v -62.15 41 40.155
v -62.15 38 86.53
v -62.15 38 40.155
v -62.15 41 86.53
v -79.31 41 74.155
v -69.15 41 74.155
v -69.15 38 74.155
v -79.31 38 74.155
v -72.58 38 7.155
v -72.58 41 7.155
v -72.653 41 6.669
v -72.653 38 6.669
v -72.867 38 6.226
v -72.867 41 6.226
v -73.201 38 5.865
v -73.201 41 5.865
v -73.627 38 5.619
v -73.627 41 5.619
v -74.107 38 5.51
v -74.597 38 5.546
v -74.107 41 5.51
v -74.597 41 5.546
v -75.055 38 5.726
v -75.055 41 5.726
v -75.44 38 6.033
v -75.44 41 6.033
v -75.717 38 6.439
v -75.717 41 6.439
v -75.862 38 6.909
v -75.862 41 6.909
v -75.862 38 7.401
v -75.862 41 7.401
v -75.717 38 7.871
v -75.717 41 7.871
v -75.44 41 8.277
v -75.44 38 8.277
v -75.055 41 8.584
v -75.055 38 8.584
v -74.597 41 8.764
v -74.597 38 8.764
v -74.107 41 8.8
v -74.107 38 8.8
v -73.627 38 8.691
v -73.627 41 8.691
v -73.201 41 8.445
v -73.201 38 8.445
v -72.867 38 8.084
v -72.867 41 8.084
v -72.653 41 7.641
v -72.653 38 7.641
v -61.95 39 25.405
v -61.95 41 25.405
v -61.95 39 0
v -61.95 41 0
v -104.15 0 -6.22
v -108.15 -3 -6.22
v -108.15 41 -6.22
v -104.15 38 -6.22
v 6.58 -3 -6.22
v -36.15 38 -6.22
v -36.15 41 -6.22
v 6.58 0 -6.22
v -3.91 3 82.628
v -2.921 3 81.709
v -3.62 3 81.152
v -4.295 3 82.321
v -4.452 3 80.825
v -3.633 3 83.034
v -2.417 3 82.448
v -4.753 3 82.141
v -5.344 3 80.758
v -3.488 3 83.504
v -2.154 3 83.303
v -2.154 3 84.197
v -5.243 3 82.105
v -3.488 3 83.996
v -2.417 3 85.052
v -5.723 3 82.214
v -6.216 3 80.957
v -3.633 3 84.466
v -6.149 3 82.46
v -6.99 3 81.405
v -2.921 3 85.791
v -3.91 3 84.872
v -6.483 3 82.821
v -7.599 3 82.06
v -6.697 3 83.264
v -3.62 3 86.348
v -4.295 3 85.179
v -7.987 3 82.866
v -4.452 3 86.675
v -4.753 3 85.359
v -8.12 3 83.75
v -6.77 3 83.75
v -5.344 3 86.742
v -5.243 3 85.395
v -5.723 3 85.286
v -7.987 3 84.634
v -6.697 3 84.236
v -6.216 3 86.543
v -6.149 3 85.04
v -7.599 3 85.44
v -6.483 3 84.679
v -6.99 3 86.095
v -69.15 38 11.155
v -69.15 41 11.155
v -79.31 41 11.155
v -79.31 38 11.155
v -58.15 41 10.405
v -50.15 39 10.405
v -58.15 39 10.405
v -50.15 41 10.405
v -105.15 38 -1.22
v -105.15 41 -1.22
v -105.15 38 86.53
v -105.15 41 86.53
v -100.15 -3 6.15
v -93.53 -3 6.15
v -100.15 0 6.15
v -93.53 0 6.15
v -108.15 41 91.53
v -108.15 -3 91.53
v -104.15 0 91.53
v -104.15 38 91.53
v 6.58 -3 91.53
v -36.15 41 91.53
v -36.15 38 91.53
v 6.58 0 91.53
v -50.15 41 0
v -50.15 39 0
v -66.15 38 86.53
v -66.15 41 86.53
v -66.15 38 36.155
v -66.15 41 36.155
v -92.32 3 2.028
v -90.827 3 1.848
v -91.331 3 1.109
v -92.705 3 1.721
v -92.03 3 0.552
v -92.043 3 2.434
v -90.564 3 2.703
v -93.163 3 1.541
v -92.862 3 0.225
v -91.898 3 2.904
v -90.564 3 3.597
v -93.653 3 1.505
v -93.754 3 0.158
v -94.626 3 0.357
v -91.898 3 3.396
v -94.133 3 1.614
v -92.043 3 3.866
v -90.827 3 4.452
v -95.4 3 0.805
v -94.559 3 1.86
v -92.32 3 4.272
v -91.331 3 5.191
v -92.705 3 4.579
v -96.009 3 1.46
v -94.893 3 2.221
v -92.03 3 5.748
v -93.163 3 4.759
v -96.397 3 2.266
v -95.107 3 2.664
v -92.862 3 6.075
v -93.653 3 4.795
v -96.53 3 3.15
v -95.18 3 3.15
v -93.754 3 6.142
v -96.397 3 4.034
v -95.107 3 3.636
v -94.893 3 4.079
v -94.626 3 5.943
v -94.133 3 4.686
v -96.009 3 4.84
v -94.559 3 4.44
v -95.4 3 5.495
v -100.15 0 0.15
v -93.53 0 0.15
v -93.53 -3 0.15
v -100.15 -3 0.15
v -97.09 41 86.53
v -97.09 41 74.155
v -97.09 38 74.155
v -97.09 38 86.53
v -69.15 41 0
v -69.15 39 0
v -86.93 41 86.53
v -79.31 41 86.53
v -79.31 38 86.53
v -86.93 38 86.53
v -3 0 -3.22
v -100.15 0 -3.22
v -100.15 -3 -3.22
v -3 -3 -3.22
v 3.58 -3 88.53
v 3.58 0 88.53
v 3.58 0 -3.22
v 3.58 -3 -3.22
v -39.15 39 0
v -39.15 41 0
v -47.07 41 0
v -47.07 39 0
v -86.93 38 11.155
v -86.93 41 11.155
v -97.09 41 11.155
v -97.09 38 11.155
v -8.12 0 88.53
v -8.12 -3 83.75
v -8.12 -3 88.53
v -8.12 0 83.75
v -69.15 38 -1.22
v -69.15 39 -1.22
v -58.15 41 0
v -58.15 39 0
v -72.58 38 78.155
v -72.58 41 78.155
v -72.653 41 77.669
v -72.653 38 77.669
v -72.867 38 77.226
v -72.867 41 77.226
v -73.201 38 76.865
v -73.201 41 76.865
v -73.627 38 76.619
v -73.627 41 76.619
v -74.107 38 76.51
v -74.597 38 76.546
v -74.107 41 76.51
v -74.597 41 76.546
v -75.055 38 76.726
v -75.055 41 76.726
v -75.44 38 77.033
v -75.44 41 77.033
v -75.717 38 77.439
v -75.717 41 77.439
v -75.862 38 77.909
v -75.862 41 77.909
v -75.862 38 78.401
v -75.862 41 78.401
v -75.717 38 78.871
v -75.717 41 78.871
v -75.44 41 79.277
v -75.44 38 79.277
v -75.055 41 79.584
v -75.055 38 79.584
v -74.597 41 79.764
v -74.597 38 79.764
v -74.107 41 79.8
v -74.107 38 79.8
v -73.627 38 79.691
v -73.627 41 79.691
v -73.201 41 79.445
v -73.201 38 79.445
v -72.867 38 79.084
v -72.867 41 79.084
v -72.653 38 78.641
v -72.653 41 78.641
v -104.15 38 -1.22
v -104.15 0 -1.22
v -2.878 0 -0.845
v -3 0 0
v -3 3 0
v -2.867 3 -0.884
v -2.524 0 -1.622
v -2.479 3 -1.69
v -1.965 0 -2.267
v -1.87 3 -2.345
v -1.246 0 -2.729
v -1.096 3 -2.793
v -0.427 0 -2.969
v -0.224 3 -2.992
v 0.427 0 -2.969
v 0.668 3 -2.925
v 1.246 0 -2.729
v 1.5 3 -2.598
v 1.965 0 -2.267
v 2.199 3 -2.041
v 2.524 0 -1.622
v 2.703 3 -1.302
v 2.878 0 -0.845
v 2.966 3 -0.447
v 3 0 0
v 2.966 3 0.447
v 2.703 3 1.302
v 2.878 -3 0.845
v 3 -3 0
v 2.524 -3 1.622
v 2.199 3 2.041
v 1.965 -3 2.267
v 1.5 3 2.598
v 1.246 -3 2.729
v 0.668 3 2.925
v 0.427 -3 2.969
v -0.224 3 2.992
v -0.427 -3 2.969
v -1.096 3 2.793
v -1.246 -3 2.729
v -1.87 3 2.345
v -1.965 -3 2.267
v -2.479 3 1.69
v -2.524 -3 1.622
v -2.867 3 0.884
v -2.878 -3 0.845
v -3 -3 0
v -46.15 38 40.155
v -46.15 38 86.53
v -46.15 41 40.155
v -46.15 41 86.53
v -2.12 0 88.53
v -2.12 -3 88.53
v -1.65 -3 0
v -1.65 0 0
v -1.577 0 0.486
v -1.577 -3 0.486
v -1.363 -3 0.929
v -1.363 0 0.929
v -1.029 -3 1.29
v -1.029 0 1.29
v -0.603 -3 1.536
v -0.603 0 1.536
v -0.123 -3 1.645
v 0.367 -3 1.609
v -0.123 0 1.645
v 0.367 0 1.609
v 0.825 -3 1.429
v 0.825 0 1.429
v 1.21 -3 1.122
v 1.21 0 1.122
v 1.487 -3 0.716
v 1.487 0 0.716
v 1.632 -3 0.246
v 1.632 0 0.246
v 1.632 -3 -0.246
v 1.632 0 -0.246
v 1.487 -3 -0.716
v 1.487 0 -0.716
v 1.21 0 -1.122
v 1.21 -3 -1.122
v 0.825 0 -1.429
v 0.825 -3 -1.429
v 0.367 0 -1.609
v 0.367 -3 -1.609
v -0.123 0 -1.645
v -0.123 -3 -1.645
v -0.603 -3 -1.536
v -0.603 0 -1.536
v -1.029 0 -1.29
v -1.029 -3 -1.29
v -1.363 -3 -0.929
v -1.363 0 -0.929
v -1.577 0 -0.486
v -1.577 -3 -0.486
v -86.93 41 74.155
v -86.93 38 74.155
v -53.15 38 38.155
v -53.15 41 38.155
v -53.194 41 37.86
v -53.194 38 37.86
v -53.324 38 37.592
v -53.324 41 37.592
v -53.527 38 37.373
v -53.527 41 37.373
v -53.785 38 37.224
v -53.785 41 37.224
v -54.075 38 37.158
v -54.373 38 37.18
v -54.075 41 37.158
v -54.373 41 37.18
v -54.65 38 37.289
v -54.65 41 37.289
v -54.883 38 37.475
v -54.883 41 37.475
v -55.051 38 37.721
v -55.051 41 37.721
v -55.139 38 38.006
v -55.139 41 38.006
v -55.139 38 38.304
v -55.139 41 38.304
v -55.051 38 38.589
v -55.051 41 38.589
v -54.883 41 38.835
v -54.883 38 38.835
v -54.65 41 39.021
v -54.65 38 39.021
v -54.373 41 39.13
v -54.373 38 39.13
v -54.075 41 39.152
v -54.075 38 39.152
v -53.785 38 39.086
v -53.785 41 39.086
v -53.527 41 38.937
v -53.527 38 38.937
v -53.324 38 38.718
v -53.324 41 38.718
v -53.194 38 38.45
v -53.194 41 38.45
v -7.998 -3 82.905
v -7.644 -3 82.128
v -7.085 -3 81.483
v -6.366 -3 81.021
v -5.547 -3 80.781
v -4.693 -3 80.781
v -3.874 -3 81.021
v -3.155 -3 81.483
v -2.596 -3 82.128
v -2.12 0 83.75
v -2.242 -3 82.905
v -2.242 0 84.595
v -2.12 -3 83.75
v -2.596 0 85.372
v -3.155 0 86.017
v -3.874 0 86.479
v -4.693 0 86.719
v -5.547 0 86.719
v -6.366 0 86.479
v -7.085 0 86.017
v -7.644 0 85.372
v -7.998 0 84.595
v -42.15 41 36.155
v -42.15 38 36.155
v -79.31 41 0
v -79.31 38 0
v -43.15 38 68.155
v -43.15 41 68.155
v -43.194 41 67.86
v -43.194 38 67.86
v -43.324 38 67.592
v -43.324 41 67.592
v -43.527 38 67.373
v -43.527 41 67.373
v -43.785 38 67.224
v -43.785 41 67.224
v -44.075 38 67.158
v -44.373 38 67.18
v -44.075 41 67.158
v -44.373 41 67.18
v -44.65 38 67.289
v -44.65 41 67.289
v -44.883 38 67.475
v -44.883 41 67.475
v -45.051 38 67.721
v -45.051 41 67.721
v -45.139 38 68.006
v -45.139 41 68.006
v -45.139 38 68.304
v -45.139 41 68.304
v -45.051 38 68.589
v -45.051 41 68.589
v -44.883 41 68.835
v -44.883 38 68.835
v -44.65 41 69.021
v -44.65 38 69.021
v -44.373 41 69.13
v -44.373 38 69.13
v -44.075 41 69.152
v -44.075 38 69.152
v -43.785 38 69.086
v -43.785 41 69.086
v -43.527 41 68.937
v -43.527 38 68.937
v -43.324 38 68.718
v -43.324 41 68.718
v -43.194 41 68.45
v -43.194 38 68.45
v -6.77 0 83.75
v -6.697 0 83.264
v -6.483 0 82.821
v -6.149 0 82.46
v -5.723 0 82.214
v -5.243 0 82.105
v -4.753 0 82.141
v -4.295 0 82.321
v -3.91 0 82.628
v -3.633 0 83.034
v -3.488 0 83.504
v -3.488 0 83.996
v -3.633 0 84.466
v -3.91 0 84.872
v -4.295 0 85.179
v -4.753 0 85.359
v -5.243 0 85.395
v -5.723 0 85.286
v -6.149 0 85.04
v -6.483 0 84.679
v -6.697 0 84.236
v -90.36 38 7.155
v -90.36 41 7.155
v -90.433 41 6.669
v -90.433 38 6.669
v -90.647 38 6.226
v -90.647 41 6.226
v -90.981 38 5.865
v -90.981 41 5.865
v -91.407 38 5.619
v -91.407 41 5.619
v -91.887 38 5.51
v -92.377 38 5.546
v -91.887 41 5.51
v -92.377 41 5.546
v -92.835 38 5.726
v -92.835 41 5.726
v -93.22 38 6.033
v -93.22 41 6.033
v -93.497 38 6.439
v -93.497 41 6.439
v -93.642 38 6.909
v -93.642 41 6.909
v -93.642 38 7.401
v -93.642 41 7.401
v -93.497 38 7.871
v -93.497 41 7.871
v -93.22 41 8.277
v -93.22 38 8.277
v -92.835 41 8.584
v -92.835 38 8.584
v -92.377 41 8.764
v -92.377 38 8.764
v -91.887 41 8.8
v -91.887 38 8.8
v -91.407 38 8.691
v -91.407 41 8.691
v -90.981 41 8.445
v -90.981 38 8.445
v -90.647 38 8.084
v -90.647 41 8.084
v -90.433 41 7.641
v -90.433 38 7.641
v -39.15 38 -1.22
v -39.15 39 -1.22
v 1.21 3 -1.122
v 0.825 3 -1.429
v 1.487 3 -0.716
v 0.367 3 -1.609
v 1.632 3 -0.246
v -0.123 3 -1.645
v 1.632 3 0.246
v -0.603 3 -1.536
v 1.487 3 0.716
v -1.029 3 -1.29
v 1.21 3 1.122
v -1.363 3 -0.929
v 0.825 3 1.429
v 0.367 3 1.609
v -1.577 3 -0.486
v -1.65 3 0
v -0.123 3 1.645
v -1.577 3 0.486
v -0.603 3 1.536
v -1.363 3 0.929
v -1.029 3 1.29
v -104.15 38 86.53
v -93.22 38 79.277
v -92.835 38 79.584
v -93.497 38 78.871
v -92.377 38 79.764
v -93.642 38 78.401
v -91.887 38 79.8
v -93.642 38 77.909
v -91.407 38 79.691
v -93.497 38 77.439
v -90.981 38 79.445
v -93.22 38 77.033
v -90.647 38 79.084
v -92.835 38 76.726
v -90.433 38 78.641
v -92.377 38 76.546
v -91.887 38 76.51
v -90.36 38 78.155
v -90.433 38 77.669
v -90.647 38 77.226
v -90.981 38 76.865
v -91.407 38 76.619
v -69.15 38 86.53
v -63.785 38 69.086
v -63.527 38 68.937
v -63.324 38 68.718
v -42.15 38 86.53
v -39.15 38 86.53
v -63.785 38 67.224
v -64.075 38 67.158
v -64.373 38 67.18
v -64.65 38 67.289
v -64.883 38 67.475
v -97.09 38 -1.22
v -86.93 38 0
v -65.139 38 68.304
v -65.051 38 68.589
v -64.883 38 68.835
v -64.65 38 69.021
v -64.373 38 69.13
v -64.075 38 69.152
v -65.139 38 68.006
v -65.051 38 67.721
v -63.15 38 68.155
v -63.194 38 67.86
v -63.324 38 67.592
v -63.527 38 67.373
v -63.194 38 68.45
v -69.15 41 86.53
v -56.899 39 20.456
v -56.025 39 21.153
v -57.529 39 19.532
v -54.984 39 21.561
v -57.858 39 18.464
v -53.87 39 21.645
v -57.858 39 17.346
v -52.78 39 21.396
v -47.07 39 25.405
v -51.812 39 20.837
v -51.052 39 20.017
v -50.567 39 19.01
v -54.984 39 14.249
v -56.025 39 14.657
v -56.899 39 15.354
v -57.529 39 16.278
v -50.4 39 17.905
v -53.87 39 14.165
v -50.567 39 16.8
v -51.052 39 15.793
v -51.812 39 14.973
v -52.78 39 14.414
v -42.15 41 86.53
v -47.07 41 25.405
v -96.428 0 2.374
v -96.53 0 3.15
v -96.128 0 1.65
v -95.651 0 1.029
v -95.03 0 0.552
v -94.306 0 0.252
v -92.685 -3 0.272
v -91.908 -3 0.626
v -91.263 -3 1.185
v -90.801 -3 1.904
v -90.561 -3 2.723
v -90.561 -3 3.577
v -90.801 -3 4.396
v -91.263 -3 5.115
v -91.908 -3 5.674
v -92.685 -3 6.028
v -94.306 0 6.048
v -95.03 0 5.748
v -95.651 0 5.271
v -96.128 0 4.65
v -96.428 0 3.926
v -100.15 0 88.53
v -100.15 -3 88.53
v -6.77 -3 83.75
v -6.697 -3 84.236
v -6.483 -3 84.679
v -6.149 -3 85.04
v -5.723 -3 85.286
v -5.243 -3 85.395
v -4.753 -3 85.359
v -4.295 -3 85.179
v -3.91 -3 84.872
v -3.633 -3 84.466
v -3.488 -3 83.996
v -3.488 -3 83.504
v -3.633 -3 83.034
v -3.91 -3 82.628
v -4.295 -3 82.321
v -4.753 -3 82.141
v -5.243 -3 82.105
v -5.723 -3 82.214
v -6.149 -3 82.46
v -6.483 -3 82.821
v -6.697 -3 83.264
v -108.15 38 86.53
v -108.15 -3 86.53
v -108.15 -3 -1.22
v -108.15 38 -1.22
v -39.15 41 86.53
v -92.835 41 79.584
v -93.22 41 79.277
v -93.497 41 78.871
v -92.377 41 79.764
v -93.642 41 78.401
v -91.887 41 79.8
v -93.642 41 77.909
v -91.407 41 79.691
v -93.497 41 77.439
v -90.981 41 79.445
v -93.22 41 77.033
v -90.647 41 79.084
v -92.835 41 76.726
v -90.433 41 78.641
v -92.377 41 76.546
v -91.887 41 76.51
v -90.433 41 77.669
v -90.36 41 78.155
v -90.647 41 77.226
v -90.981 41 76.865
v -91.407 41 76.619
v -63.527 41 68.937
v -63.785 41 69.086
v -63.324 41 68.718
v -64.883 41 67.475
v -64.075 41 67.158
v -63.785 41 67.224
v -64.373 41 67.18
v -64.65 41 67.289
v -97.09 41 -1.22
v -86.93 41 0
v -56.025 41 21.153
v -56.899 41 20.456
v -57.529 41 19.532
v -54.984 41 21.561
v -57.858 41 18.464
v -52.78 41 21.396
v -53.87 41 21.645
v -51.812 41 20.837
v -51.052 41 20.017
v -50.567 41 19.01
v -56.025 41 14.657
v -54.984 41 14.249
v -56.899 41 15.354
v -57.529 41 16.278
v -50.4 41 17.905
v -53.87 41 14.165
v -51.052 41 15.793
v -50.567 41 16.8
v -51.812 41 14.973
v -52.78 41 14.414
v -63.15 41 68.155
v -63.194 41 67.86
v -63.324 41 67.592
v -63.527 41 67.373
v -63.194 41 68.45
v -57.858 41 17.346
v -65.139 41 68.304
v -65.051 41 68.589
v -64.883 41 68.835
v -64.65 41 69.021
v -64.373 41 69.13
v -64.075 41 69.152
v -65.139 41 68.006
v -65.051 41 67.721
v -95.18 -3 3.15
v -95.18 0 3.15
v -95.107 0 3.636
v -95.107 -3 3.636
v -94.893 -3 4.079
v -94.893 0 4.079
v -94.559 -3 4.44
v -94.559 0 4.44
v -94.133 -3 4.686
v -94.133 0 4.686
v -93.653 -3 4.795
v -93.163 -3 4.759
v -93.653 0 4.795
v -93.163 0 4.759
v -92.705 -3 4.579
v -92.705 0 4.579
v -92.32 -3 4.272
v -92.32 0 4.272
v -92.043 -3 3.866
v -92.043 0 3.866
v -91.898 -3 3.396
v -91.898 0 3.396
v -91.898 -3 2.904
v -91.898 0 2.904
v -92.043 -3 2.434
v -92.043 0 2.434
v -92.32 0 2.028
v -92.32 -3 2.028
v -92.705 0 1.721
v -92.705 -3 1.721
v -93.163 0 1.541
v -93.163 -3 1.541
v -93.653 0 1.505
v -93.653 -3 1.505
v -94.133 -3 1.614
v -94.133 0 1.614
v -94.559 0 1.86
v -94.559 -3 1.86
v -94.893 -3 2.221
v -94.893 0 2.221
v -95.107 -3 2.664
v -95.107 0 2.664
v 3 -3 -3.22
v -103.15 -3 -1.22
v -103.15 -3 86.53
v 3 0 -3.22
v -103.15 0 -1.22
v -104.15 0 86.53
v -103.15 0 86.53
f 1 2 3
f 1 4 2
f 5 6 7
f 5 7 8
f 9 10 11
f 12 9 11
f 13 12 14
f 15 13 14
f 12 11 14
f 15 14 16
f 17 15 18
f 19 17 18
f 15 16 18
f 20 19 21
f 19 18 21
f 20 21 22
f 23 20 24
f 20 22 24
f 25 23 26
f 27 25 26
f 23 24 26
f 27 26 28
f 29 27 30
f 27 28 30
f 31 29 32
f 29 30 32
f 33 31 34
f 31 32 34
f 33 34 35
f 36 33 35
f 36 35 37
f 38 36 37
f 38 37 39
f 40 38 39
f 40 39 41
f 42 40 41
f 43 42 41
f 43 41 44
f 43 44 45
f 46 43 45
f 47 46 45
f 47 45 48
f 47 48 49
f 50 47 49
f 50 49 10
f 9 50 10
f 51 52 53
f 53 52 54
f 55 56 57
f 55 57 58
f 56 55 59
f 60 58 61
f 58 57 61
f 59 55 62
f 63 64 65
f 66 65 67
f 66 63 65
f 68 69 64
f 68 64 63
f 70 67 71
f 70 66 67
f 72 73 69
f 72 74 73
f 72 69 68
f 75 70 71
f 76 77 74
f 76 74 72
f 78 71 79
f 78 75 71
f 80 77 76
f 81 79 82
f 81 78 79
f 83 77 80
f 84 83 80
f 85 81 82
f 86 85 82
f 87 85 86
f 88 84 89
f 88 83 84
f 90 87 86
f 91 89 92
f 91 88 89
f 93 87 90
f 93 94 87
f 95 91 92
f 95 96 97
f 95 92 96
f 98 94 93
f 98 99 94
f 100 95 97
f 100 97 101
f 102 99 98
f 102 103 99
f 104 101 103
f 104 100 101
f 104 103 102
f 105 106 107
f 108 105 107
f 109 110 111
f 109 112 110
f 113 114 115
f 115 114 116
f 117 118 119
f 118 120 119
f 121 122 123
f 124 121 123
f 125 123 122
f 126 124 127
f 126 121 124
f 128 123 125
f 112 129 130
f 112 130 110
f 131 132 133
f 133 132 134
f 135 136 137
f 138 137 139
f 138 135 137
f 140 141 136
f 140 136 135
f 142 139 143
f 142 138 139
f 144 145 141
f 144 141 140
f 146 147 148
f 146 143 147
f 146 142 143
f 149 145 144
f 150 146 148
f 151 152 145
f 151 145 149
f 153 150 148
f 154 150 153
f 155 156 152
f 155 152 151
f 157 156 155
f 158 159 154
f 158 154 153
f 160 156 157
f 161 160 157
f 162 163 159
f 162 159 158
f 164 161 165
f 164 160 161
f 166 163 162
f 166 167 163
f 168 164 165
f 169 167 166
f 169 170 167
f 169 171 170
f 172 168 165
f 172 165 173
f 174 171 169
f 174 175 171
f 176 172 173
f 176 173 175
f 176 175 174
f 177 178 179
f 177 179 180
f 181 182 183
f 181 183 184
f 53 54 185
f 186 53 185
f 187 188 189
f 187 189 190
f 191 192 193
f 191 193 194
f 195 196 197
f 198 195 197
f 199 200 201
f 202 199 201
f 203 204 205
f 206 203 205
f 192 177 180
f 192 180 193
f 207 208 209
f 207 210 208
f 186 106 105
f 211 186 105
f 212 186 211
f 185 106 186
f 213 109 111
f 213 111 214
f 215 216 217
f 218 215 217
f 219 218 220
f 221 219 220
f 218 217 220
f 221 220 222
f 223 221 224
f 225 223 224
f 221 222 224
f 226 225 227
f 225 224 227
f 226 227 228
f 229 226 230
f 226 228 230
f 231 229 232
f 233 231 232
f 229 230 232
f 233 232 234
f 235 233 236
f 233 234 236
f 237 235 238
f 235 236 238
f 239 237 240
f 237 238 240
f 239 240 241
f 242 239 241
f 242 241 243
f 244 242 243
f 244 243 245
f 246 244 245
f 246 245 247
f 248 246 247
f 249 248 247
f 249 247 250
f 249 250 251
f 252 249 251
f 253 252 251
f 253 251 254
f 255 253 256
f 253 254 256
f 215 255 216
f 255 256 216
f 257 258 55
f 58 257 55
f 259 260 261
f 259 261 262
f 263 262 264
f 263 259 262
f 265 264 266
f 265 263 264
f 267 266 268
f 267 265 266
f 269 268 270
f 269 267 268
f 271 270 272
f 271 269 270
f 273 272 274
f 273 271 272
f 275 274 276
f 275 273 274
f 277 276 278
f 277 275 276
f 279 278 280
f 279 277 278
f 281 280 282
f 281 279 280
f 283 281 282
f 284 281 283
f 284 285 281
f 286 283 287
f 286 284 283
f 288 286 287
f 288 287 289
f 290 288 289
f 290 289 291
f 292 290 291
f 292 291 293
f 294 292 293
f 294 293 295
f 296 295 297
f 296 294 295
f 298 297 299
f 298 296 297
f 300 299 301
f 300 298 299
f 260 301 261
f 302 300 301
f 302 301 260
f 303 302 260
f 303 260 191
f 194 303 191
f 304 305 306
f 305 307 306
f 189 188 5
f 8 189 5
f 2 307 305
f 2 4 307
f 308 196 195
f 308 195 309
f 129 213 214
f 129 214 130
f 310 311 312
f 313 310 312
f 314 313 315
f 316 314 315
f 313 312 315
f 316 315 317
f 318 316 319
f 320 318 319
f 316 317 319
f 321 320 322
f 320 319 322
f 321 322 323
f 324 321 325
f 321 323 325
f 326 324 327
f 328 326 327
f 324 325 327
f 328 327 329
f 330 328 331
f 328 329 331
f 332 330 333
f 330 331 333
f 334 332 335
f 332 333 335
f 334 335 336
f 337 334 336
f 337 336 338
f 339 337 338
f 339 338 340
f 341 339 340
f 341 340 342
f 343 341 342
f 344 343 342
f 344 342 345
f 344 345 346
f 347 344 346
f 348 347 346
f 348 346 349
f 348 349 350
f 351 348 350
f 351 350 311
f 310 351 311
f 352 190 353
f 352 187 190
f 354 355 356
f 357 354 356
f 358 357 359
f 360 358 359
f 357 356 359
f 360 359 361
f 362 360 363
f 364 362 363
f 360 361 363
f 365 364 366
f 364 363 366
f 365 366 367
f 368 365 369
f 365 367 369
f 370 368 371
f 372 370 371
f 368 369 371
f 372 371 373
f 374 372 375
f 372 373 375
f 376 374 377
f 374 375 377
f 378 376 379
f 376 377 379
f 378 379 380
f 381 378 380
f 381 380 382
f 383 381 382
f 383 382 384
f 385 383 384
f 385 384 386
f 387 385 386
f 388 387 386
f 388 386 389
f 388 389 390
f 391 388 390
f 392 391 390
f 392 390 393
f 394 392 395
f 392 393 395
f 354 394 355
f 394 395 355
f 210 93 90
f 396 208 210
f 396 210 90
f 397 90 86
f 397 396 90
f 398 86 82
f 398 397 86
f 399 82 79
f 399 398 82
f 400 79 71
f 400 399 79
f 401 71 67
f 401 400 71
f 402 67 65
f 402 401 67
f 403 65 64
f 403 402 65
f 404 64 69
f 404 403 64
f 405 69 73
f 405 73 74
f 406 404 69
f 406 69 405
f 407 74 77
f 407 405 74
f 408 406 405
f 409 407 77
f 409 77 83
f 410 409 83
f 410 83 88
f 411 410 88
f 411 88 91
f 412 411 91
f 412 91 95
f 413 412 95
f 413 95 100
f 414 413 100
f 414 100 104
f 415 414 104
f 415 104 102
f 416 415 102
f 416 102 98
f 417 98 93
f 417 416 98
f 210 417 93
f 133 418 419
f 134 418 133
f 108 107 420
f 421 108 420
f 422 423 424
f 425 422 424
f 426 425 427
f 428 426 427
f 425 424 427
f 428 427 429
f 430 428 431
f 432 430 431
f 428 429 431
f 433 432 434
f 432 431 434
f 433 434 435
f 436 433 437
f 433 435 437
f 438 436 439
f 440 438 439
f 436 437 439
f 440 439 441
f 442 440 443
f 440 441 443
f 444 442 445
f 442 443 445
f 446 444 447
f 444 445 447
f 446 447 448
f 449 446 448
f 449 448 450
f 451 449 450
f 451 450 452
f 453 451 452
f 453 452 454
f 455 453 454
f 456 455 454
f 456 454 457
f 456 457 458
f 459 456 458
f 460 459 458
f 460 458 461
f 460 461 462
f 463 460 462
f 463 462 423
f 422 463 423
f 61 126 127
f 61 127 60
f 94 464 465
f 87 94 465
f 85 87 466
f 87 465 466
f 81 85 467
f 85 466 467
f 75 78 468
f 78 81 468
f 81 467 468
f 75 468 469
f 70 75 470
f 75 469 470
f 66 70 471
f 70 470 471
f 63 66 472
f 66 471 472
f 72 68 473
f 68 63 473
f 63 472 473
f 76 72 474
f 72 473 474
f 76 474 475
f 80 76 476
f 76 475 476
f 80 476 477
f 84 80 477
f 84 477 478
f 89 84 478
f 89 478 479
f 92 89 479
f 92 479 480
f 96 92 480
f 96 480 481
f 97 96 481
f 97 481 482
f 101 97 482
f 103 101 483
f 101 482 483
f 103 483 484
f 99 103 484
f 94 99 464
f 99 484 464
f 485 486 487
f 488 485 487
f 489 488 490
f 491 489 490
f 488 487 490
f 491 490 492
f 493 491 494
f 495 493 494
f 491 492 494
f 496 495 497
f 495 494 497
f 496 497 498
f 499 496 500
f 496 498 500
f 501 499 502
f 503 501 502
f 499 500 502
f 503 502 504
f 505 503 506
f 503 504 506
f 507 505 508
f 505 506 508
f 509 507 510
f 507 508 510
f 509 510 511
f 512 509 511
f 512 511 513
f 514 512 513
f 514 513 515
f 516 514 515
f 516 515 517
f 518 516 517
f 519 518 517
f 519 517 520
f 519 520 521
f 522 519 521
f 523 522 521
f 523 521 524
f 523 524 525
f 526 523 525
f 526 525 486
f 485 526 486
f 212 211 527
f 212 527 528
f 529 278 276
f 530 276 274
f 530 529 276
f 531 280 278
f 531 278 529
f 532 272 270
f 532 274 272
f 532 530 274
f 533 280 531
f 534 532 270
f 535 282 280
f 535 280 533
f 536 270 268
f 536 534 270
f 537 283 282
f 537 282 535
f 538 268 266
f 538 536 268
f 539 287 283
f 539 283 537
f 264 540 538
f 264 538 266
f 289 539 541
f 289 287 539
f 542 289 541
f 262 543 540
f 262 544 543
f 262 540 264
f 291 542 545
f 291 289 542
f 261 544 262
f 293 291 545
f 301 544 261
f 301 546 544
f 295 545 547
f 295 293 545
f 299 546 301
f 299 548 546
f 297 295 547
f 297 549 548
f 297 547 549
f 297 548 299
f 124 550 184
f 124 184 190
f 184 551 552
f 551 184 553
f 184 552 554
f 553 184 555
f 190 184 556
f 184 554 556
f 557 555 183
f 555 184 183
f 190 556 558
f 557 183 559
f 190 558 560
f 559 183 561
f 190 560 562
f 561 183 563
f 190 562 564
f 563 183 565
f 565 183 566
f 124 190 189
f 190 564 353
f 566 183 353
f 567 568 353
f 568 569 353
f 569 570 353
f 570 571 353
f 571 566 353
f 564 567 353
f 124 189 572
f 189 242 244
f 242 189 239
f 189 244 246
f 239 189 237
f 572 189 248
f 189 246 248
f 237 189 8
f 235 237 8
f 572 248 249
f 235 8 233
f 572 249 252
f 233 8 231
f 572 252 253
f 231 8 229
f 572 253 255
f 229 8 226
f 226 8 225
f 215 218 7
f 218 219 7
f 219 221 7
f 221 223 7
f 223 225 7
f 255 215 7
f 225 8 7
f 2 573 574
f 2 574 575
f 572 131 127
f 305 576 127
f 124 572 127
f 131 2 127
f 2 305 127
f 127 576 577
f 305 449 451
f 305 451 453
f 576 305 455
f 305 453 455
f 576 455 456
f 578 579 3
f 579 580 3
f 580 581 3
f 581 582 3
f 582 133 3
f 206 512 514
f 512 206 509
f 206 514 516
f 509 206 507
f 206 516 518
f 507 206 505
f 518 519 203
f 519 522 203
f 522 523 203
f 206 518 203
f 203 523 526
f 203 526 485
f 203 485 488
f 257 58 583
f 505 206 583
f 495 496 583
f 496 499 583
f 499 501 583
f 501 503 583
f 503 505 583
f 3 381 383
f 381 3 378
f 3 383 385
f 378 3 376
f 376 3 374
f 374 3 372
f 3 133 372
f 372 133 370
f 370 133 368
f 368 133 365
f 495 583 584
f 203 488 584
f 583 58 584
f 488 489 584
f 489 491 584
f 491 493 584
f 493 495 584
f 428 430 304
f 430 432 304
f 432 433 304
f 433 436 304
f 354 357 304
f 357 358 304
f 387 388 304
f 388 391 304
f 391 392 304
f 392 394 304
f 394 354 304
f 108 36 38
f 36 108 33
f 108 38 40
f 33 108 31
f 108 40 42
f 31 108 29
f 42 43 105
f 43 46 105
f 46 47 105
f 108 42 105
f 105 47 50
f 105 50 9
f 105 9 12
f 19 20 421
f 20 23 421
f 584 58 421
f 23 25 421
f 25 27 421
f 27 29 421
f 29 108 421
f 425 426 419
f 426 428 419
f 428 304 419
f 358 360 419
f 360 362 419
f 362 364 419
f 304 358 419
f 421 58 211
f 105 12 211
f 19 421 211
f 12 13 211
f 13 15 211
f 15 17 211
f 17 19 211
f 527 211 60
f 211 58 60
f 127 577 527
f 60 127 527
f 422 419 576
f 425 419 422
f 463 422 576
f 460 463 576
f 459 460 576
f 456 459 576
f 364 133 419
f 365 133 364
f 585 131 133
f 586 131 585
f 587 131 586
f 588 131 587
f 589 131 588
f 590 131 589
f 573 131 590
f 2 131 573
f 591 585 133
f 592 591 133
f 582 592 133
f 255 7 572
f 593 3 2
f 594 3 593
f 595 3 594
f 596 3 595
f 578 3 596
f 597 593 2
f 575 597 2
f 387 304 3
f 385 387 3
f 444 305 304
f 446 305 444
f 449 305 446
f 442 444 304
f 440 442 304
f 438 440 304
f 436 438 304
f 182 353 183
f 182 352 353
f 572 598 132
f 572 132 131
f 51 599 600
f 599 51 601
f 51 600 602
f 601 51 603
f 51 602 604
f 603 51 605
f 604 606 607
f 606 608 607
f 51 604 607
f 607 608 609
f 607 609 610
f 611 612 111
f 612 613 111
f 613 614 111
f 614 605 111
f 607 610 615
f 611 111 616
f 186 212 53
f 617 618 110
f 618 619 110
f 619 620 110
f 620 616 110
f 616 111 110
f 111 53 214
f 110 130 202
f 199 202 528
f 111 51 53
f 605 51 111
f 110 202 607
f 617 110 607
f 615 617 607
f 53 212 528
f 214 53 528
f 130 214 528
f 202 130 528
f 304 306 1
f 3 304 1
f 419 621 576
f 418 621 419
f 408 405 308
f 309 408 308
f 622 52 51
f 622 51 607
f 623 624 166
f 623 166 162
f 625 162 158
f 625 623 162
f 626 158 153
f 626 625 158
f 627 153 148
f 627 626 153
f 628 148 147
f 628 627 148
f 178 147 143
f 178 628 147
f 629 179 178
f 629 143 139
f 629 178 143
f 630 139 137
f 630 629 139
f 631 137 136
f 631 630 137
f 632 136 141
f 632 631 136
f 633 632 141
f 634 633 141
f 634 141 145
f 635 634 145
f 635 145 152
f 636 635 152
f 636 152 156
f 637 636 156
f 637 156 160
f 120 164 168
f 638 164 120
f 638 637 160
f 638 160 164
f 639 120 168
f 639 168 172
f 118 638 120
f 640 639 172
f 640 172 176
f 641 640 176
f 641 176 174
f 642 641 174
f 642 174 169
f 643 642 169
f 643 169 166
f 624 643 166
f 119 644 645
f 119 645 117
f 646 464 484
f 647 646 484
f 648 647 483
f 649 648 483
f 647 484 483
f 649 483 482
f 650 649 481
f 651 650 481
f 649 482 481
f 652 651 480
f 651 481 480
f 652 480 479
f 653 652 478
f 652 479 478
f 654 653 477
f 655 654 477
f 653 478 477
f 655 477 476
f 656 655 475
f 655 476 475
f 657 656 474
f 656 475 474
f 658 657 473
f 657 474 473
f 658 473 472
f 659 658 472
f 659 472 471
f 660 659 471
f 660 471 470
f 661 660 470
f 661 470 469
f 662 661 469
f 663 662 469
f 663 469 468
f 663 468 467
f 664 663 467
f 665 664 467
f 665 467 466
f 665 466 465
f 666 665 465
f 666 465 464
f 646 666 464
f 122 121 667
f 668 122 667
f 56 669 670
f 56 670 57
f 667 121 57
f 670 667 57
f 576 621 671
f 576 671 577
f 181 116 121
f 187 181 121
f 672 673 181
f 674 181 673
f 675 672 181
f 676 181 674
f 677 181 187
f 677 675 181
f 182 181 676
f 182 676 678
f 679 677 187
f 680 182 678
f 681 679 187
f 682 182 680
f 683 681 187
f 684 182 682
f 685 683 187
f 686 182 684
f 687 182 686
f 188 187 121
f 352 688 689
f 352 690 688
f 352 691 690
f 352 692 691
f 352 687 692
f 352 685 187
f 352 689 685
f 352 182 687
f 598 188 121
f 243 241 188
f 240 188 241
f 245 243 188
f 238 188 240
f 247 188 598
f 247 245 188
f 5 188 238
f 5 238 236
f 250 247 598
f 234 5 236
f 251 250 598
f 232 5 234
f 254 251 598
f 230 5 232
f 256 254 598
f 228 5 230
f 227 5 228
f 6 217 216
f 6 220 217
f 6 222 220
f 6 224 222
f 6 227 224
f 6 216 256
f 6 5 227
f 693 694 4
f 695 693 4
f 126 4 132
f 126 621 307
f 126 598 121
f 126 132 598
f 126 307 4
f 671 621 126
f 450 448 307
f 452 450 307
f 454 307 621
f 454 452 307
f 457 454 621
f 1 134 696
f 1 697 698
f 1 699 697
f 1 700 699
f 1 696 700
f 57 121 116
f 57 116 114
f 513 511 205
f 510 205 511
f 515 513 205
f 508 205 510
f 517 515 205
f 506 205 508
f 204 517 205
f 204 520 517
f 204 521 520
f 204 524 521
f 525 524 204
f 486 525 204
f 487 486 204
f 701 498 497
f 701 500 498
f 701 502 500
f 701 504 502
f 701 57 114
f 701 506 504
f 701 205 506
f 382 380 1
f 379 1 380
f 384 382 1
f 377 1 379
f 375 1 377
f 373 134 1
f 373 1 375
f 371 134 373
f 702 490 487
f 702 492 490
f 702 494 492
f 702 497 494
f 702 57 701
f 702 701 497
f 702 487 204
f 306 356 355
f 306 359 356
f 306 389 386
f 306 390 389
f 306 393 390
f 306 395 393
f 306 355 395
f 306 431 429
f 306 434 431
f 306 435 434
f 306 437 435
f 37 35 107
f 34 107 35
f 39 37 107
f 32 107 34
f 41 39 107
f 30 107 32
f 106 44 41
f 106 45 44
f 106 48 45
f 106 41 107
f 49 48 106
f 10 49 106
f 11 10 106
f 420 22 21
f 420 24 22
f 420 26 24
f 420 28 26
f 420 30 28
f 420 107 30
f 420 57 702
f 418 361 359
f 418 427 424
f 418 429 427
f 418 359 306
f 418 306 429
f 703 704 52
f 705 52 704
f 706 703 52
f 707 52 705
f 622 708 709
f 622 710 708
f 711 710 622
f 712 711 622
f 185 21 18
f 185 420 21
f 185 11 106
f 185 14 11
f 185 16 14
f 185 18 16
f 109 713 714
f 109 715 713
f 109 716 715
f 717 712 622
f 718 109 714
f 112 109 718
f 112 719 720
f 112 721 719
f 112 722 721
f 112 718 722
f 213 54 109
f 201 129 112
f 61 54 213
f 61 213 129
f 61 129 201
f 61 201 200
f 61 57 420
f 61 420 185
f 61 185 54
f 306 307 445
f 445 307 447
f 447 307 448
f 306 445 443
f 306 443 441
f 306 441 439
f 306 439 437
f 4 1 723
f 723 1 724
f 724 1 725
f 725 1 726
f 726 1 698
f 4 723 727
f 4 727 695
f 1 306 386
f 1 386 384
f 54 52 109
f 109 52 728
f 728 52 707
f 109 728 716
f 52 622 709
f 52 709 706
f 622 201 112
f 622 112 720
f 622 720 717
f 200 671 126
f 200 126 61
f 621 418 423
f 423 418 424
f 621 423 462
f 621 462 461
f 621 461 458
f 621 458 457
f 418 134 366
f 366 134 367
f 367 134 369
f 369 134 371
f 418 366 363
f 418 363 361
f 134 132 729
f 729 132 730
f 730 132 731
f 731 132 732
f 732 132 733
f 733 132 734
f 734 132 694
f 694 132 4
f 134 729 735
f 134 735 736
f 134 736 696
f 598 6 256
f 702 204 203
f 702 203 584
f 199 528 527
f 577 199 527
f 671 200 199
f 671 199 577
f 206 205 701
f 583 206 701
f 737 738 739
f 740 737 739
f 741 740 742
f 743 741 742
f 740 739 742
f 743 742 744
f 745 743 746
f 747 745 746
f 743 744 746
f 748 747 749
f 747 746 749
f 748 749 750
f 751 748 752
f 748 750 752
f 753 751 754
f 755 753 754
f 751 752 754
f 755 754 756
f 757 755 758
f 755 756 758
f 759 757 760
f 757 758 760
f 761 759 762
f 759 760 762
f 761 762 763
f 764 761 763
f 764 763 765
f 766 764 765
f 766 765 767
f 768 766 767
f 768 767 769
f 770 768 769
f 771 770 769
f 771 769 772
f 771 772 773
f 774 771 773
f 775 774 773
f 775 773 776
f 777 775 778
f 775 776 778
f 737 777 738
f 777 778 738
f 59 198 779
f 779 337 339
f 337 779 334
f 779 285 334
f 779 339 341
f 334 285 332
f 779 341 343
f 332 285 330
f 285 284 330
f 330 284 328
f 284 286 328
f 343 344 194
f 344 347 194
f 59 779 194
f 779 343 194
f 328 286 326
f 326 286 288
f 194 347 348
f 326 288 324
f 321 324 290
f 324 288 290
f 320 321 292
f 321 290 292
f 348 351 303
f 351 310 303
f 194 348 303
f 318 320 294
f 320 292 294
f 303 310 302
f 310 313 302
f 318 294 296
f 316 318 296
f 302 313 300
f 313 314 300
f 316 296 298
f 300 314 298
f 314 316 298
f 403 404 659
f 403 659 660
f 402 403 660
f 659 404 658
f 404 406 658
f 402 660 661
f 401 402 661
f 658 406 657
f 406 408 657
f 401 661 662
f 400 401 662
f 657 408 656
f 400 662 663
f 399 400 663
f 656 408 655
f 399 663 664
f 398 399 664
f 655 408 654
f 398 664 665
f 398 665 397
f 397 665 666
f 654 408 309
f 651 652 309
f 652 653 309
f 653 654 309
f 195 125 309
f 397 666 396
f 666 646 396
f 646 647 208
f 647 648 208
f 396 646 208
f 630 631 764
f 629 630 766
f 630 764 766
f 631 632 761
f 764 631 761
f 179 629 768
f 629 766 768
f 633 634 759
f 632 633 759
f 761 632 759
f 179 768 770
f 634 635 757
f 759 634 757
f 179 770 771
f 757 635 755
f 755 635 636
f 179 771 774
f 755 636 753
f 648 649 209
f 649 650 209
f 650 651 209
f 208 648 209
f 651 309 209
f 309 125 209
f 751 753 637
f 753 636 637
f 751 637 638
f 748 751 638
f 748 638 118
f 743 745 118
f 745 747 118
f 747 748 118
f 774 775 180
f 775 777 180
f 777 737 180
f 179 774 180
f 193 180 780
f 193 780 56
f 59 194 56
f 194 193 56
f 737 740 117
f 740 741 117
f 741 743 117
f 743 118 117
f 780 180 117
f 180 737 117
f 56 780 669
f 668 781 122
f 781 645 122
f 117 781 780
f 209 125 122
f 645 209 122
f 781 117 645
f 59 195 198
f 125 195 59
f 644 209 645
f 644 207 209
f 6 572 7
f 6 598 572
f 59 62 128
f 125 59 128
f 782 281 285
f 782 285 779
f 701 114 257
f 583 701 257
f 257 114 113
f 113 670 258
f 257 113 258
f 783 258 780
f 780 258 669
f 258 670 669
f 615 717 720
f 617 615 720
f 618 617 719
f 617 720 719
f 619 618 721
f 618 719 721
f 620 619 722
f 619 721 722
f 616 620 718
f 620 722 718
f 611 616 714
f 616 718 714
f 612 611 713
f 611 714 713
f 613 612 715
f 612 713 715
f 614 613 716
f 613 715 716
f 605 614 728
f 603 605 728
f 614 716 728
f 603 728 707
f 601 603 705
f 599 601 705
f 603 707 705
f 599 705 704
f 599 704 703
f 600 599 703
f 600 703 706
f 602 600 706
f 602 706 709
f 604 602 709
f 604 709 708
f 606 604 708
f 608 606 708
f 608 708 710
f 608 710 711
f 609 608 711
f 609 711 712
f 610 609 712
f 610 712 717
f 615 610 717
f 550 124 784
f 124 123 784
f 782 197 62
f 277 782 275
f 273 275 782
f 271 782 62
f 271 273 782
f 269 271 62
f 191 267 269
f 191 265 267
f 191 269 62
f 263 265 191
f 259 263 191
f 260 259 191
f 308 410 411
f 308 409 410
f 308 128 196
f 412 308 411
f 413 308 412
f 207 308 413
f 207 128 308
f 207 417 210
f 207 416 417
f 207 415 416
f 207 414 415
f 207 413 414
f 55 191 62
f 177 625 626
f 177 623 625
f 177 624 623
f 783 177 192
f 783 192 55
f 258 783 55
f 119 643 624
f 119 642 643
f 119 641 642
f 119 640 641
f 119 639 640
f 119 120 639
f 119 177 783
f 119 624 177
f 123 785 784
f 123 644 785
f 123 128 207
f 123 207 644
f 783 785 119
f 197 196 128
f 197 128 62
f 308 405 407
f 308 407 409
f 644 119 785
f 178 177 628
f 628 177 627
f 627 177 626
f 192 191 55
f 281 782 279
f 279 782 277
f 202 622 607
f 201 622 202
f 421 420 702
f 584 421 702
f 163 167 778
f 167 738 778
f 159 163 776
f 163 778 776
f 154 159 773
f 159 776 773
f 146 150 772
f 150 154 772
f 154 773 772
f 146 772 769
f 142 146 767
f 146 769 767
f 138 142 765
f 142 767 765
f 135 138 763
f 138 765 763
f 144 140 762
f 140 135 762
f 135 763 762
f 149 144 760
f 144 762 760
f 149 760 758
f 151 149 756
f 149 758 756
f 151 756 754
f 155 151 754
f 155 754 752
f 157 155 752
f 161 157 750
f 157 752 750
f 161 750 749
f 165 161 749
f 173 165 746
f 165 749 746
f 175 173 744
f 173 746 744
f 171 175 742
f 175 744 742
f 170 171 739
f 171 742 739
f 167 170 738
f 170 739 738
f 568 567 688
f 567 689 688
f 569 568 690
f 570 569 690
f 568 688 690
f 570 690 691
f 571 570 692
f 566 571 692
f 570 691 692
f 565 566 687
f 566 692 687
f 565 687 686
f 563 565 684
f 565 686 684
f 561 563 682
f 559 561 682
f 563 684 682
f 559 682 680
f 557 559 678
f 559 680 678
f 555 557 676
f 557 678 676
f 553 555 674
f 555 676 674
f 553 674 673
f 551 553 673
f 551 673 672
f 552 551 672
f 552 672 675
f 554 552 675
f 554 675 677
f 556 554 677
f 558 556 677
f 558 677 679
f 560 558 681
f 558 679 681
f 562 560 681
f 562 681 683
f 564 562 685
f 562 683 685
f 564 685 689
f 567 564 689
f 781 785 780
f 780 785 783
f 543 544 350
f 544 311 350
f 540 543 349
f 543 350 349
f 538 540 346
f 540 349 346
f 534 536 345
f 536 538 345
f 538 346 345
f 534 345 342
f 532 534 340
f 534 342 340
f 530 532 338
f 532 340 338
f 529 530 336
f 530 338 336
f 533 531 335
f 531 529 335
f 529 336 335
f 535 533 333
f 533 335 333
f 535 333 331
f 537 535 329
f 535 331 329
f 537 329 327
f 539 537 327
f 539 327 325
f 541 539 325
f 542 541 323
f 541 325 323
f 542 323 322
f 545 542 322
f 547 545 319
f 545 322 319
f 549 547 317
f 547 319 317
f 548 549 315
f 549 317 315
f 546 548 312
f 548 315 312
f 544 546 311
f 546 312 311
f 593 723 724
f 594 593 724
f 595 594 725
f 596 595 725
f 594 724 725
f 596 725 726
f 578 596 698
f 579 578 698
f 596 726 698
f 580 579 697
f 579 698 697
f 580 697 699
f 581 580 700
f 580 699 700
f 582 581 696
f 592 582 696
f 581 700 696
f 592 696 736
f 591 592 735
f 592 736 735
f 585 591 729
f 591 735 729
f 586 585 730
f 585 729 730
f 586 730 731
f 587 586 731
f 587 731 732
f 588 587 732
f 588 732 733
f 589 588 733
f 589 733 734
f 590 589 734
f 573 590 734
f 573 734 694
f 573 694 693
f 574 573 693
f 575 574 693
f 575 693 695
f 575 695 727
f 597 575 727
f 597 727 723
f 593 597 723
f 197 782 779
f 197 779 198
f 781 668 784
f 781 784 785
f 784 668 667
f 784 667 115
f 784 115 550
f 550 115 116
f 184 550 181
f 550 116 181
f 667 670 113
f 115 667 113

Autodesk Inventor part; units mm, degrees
ref_plane "YZ Plane" through (0, 0, 0) normal (1, 0, 0) x (0, 1, 0)
ref_plane "XZ Plane" through (0, 0, 0) normal (0, 1, 0) x (-1, 0, 0)
ref_plane "XY Plane" through (0, 0, 0) normal (0, 0, 1) x (1, 0, 0)
sketch "Sketch1" plane through (0, 0, 0) normal (0, 1, 0) x (-1, 0, 0)
  circle A0 centre (0, 0) radius 1.65
  circle A1 centre (0, 0) radius 3
  circle A2 centre (5.12, 83.75) radius 1.65
  circle A3 centre (5.12, 83.75) radius 3
  circle A4 centre (93.53, 3.15) radius 1.65
  circle A5 centre (93.53, 3.15) radius 3
  line L0 (-6.58, 0) -> (-6.58, -6.22)
  line L1 (-6.58, -6.22) -> (-6.58, 91.53)
  line L2 (-6.58, 91.53) -> (103.15, 91.53)
  line L3 (103.15, 86.53) -> (103.15, -1.22)
  line L4 (103.15, -6.22) -> (-6.58, -6.22)
  line L5 (-6.58, 91.53) -> (-6.58, 88.53)
  line L6 (103.15, 91.53) -> (100.15, 91.53)
  line L7 (3, 0) -> (3, -3.22)
  line L8 (-3, 0) -> (-3, -3.22)
  line L9 (2.12, 83.75) -> (2.12, 88.53)
  line L10 (8.12, 83.75) -> (8.12, 88.53)
  line L11 (93.53, 6.15) -> (100.15, 6.15)
  line L12 (93.53, 0.15) -> (100.15, 0.15)
  line L13 (-3.58, 88.53) -> (-3.58, -3.22)
  line L14 (103.15, 91.53) -> (108.15, 91.53)
  line L15 (108.15, 91.53) -> (108.15, 86.53)
  line L16 (108.15, 86.53) -> (103.15, 86.53)
  line L17 (103.15, -6.22) -> (108.15, -6.22)
  line L18 (108.15, -6.22) -> (108.15, -1.22)
  line L19 (108.15, -1.22) -> (103.15, -1.22)
  line L20 (100.15, 88.53) -> (100.15, 6.15)
  line L21 (100.15, 0.15) -> (100.15, -3.22)
  line L22 (100.15, -3.22) -> (3, -3.22)
  line L23 (-3, -3.22) -> (-3.58, -3.22)
  line L24 (-3.58, 88.53) -> (2.12, 88.53)
  line L25 (8.12, 88.53) -> (100.15, 88.53)
  dimension "d0" = 3.3
  dimension "d1" = 6
  dimension "d4" = 3.3
  dimension "d5" = 6
  dimension "d8" = 3.3
  dimension "d9" = 6
extrude "Extrusion1" add sketch "Sketch1" against normal blind 3 contours A1 | A5 | A3 | L1 L2 L14 L15 L16 L3 L19 L18 L17 L4 L0
extrude "Extrusion2" add sketch "Sketch1" along normal blind 3 contours A1 | A5 | A3
sketch "Sketch2" plane through (0, 0, 0) normal (0, 1, 0) x (1, 0, 0)
  line L0 (-103.15, 1.22) -> (-108.15, 1.22) projected
  line L1 (-103.15, 1.22) -> (-103.15, 6.22)
  line L2 (-108.15, 6.22) -> (6.58, 6.22) projected
  line L3 (-103.15, 6.22) -> (-108.15, 6.22)
  line L4 (-108.15, 6.22) -> (-108.15, 1.22)
  line L5 (-103.15, 1.22) -> (-103.15, -86.53) projected
  line L6 (-108.15, 1.22) -> (-103.15, 1.22)
  line L7 (-108.15, -91.53) -> (-108.15, -86.53) projected
  line L8 (-108.15, -91.53) -> (-103.15, -91.53)
  line L9 (6.58, -91.53) -> (-108.15, -91.53) projected
  line L10 (-103.15, -86.53) -> (-103.15, -91.53)
  line L11 (-108.15, -86.53) -> (-103.15, -86.53) projected
  line L12 (-103.15, -86.53) -> (-108.15, -86.53)
  line L13 (-108.15, -86.53) -> (-108.15, -91.53)
  line L14 (-103.15, -91.53) -> (-104.15, -91.53)
  line L15 (-104.15, -91.53) -> (-104.15, -86.53)
  line L16 (-103.15, 1.22) -> (-104.15, 1.22)
  line L17 (-104.15, 1.22) -> (-104.15, 6.22)
  point P0 (0, 0)
  dimension "d26" = 1
  dimension "d27" = 1
extrude "Extrusion3" add sketch "Sketch2" along normal blind 41 contours L0 L4 L2 L17 | L15 L8 L7 L11
sketch "Sketch3" plane through (-104.15, 0, 91.53) normal (1, 0, 0) x (0, 0, -1)
  line L0 (0, 41) -> (5, 41) projected
  line L1 (0, 41) -> (0, 38)
  line L2 (0, -3) -> (0, 41) projected
  line L3 (0, 38) -> (5, 38)
  line L4 (5, -3) -> (5, 41) projected
  line L5 (5, 38) -> (5, 41)
  line L6 (5, 41) -> (0, 41)
  line L7 (92.75, 41) -> (97.75, 41) projected
  line L8 (92.75, 41) -> (92.75, 38)
  line L9 (92.75, -3) -> (92.75, 41) projected
  line L10 (92.75, 38) -> (97.75, 38)
  line L11 (97.75, -3) -> (97.75, 41) projected
  line L12 (97.75, 41) -> (92.75, 41)
  line L13 (97.75, 41) -> (97.75, 38)
  point P0 (91.53, 0)
  dimension "d30" = 3
  dimension "d31" = 3
extrude "Extrusion4" add sketch "Sketch3" along normal blind 35
sketch "Sketch4" plane through (0, 41, 0) normal (0, 1, 0) x (1, 0, 0)
  line L0 (-69.15, -91.53) -> (-69.15, -86.53) projected
  line L1 (-108.15, 1.22) -> (-69.15, 1.22) projected
  line L2 (-69.15, -86.53) -> (-69.15, -78.155)
  line L3 (-69.15, 1.22) -> (-69.15, -7.155)
  circle A0 centre (-74.23, -78.155) radius 1.65
  circle A1 centre (-74.23, -7.155) radius 1.65
  circle A2 centre (-92.01, -78.155) radius 1.65
  circle A3 centre (-92.01, -7.155) radius 1.65
  line L4 (-69.15, -78.155) -> (-69.15, -75.155)
  line L5 (-69.15, -75.155) -> (-69.15, -74.155)
  line L6 (-69.15, -74.155) -> (-97.09, -74.155)
  line L7 (-100.15, -88.53) -> (-100.15, -6.15) projected
  line L8 (-97.09, -74.155) -> (-97.09, -86.53)
  line L9 (-97.09, -86.53) -> (-69.15, -86.53)
  line L10 (-69.15, -7.155) -> (-69.15, -11.155)
  line L11 (-69.15, -11.155) -> (-97.09, -11.155)
  line L12 (-97.09, -11.155) -> (-97.09, 1.22)
  line L13 (-97.09, 1.22) -> (-69.15, 1.22)
  point P0 (0, 0)
  dimension "d46" = 3.3
  dimension "d47" = 3.3
  dimension "d50" = 3.3
  dimension "d51" = 3.3
  dimension "d53" = 1
extrude "Extrusion5" add sketch "Sketch4" against normal blind 3
sketch "Sketch5" plane through (-69.15, 0, 91.53) normal (1, 0, 0) x (0, 0, -1)
  line L0 (0, 41) -> (0, 38) projected
  line L1 (0, 41) -> (0, 38)
  line L2 (0, 41) -> (17.375, 41) projected
  line L3 (0, 41) -> (5, 41)
  line L4 (5, 41) -> (5, 38)
  line L5 (5, -3) -> (5, 41) projected
  line L6 (5, 38) -> (0, 38) projected
  line L7 (0, 38) -> (5, 38)
  line L8 (97.75, 38) -> (97.75, 41) projected
  line L9 (97.75, 41) -> (92.75, 41)
  line L10 (97.75, 41) -> (80.375, 41) projected
  line L11 (92.75, 38) -> (92.75, 41) projected
  line L12 (92.75, 41) -> (92.75, 38)
  line L13 (97.75, 38) -> (80.375, 38) projected
  line L14 (92.75, 38) -> (97.75, 38)
  line L15 (97.75, 38) -> (97.75, 41)
  point P0 (91.53, 0)
  dimension "d59" = 5
  dimension "d60" = 5
extrude "Extrusion6" add sketch "Sketch5" along normal blind 30
sketch "Sketch7" plane through (0, 41, 0) normal (0, 1, 0) x (1, 0, 0)
  line L0 (-69.15, 1.22) -> (-69.15, -11.155) projected
  line L1 (-69.15, 1.22) -> (-46.15, 1.22)
  line L2 (-3, 3.22) -> (-100.15, 3.22) projected
  line L3 (-69.15, 1.22) -> (-69.15, -11.155) projected
  line L4 (-69.15, -11.155) -> (-69.15, -25.405)
  line L5 (-69.15, -25.405) -> (-39.15, -25.405)
  line L6 (-39.15, 1.22) -> (-39.15, 6.22) projected
  line L7 (-39.15, -25.405) -> (-39.15, 1.22)
  line L8 (-39.15, 1.22) -> (-46.15, 1.22)
  circle A0 centre (-54.15, -17.905) radius 3.75
  point P0 (0, 0)
  dimension "d117" = 7.5
extrude "Extrusion8" add sketch "Sketch7" against normal blind 2
sketch "Sketch8" plane through (0, 41, 0) normal (0, 1, 0) x (1, 0, 0)
  circle A0 centre (-74.23, -78.155) radius 1.65 projected
  circle A1 centre (-64.15, -68.155) radius 1
  circle A2 centre (-44.15, -68.155) radius 1
  circle A3 centre (-54.15, -38.155) radius 1
  line L0 (-39.15, -91.53) -> (-39.15, -86.53) projected
  line L1 (-39.15, -86.53) -> (-42.15, -86.53)
  line L2 (-42.15, -86.53) -> (-42.15, -39.155)
  line L3 (-42.15, -39.155) -> (-42.15, -36.155)
  line L4 (-66.15, -86.53) -> (-66.15, -36.155)
  line L5 (-66.15, -86.53) -> (-42.15, -86.53)
  line L6 (-66.15, -86.53) -> (-62.15, -86.53)
  line L7 (-69.15, -86.53) -> (-39.15, -86.53) projected
  line L8 (-42.15, -86.53) -> (-46.15, -86.53)
  line L9 (-62.15, -36.155) -> (-42.15, -36.155)
  line L10 (-62.15, -36.155) -> (-66.15, -36.155)
  line L11 (-46.15, -40.155) -> (-62.15, -40.155)
  line L12 (-62.15, -86.53) -> (-62.15, -40.155)
  line L13 (-46.15, -86.53) -> (-46.15, -40.155)
  point P0 (0, 0)
  dimension "d81" = 2
  dimension "d85" = 3
  dimension "d86" = 3
  dimension "d88" = 4
  dimension "d89" = 4
extrude "Extrusion9" add sketch "Sketch8" against normal blind 3 contours L5 L13 L11 L12 L4 L10 L9 L3 L2
sketch "Sketch9" plane through (0, 41, 0) normal (0, 1, 0) x (1, 0, 0)
  line L0 (-39.15, -91.53) -> (-36.15, -91.53)
  line L1 (-104.15, -91.53) -> (6.58, -91.53) projected
  line L2 (-36.15, -91.53) -> (-36.15, 6.22)
  line L3 (-108.15, 6.22) -> (6.58, 6.22) projected
  line L4 (-36.15, 6.22) -> (-39.15, 6.22)
  line L5 (-104.15, -91.53) -> (-39.15, -91.53) projected
  line L6 (-39.15, 6.22) -> (-39.15, -91.53)
  point P0 (0, 0)
  dimension "d94" = 3
extrude "Extrusion10" add sketch "Sketch9" against normal blind 3
sketch "Sketch10" plane through (0, 41, 0) normal (0, 1, 0) x (1, 0, 0)
  line L0 (-108.15, -86.53) -> (-103.15, -86.53) projected
  line L1 (-108.15, 6.22) -> (-108.15, 1.22) projected
  line L2 (-108.15, -86.53) -> (-108.15, 1.22)
  line L3 (-108.15, 1.22) -> (-105.15, 1.22)
  line L4 (-108.15, 1.22) -> (-97.09, 1.22) projected
  line L5 (-105.15, 1.22) -> (-105.15, -86.53)
  line L6 (-103.15, 1.22) -> (-103.15, -86.53) projected
  line L7 (-105.15, -86.53) -> (-108.15, -86.53)
  point P0 (0, 0)
  dimension "d97" = 3
extrude "Extrusion11" add sketch "Sketch10" against normal blind 3 contours L2 L3 L5 L0
sketch "Sketch11" plane through (0, 41, 0) normal (0, 1, 0) x (1, 0, 0)
  line L0 (-86.93, -78.155) -> (-86.93, -86.53)
  line L1 (-79.31, -78.155) -> (-79.31, -86.53)
  line L2 (-79.31, -86.53) -> (-86.93, -86.53)
  line L3 (-79.31, -78.155) -> (-79.31, -74.155)
  line L4 (-79.31, -74.155) -> (-86.93, -74.155)
  line L5 (-86.93, -78.155) -> (-86.93, -74.155)
  line L6 (-86.93, -7.155) -> (-86.93, 0)
  line L7 (-79.31, -7.155) -> (-79.31, 0)
  line L8 (-79.31, 0) -> (-86.93, 0)
  line L9 (-79.31, -7.155) -> (-79.31, -11.155)
  line L10 (-86.93, -7.155) -> (-86.93, -11.155)
  line L11 (-86.93, -11.155) -> (-79.31, -11.155)
  line L12 (-47.07, -17.905) -> (-47.07, 0)
  line L13 (-61.95, -17.905) -> (-61.95, 0)
  line L14 (-61.95, -17.905) -> (-61.95, -25.405)
  line L15 (-69.15, -25.405) -> (-39.15, -25.405) projected
  line L16 (-61.95, -25.405) -> (-47.07, -25.405)
  line L17 (-47.07, -25.405) -> (-47.07, -17.905)
  line L18 (-61.95, -25.405) -> (-69.15, -25.405)
  line L19 (-69.15, -25.405) -> (-69.15, 0)
  line L20 (-69.15, 1.22) -> (-69.15, -11.155) projected
  line L21 (-61.95, 0) -> (-69.15, 0)
  line L22 (-47.07, -25.405) -> (-39.15, -25.405)
  line L23 (-39.15, -25.405) -> (-39.15, 0)
  line L24 (-39.15, 0) -> (-47.07, 0)
  line L25 (-54.15, -17.905) -> (-54.15, -25.405)
  line L26 (-39.15, -25.405) -> (-69.15, -25.405) projected
  line L27 (-54.15, -25.405) -> (-54.15, -17.905)
  line L28 (-54.15, -17.905) -> (-54.15, -10.405)
  line L29 (-54.15, -10.405) -> (-58.15, -10.405)
  line L30 (-58.15, -10.405) -> (-58.15, 0)
  line L31 (-58.15, 0) -> (-50.15, 0)
  line L32 (-50.15, 0) -> (-50.15, -10.405)
  line L33 (-50.15, -10.405) -> (-54.15, -10.405)
  point P0 (0, 0)
  point P1 (-92.01, -78.155)
  point P2 (-74.23, -78.155)
  point P3 (-92.01, -7.155)
  dimension "d111" = 7.5
  dimension "d112" = 7.5
  dimension "d113" = 4
  dimension "d114" = 8
extrude "Extrusion12" cut sketch "Sketch11" against normal blind 10
properties part number "electronic_holder"
